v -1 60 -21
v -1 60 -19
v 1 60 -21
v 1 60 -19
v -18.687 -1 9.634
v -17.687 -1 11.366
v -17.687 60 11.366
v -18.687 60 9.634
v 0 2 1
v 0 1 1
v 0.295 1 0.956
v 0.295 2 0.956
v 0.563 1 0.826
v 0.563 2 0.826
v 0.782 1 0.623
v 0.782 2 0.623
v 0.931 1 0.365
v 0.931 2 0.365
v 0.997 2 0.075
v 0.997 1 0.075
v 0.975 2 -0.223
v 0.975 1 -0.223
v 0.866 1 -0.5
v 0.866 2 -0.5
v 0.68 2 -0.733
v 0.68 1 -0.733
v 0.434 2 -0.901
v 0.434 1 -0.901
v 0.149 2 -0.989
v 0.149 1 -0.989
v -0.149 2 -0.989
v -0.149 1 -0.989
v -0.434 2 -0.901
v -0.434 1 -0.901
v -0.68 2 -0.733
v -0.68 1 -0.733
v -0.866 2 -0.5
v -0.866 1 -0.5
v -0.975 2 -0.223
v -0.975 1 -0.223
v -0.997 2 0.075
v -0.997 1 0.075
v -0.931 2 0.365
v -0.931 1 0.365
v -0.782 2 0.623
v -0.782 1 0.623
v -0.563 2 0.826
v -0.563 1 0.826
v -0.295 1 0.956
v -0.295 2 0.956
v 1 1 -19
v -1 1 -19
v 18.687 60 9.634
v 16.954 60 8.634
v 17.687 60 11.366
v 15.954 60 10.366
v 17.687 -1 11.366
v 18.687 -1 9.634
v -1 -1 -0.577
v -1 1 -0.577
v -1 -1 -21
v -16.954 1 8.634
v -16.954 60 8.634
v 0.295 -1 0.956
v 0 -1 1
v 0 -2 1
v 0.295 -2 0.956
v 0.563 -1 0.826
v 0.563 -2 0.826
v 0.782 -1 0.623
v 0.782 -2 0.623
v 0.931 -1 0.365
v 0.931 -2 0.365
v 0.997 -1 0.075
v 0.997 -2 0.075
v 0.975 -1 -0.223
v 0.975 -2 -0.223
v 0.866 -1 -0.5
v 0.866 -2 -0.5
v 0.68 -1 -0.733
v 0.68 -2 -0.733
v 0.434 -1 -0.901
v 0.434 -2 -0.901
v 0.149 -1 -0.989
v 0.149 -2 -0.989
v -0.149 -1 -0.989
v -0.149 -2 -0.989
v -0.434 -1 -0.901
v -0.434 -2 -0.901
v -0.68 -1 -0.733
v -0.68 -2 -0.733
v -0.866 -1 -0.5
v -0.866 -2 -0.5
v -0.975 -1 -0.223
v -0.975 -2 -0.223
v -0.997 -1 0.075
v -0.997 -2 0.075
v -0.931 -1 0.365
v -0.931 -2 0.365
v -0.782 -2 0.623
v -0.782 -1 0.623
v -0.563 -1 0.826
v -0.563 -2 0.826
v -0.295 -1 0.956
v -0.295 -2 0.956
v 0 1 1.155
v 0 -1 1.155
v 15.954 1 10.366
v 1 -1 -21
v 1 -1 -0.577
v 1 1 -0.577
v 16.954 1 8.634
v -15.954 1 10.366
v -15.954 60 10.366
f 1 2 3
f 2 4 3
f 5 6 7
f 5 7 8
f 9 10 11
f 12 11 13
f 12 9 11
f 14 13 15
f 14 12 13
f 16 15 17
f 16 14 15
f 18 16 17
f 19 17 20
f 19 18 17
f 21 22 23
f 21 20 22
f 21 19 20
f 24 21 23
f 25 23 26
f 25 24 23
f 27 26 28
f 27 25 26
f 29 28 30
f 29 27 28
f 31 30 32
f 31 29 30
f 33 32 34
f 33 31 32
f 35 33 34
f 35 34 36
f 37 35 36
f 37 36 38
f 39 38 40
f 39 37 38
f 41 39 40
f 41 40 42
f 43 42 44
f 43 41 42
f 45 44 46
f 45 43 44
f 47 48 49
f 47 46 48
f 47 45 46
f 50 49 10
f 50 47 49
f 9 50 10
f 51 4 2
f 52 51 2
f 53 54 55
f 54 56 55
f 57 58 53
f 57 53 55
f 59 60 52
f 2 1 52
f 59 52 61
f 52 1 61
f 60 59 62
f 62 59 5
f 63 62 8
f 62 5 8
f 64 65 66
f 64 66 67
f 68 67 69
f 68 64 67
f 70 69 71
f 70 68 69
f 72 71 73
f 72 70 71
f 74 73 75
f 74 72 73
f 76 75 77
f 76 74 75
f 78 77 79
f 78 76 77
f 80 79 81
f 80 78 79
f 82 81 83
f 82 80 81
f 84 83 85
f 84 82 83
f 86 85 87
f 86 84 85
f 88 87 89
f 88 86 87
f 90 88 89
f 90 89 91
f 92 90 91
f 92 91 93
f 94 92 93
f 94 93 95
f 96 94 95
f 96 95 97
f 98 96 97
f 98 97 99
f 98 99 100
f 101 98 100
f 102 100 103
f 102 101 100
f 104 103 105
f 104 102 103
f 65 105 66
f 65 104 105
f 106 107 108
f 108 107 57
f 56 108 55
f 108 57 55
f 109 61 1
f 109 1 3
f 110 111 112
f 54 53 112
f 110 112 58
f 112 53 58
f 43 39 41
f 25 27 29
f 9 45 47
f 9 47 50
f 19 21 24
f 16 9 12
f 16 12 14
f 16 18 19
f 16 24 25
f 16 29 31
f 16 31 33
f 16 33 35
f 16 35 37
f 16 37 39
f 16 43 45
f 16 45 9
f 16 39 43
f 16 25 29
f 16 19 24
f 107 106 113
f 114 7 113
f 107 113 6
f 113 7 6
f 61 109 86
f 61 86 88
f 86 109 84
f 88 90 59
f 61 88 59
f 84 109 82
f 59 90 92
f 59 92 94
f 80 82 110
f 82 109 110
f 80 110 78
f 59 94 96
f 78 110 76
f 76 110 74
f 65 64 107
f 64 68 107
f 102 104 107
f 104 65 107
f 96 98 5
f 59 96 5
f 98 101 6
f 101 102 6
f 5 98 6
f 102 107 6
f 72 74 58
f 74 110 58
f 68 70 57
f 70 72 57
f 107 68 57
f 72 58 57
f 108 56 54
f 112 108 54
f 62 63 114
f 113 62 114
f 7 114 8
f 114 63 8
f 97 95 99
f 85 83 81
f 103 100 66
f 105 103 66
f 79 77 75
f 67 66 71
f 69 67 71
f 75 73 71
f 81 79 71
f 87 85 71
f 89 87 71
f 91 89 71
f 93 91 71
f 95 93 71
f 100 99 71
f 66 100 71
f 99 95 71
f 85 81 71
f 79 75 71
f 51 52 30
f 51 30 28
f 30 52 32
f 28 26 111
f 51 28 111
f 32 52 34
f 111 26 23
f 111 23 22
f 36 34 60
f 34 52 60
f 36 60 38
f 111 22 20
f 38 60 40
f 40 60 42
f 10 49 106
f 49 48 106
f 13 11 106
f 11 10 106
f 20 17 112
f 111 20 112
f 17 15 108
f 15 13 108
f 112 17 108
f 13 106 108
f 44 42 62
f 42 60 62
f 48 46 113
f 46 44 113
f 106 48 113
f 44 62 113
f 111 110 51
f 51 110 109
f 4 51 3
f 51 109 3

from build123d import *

# Parameters (mm, degrees)
ESQUISSE2_W                  = 2
ESQUISSE2_H                  = 2
ESQUISSE3_R                  = 1
BOSS_EXTRU_1_DEPTH           = 2
R_P_TITION_CIRCULAIRE1_COUNT = 3


with BuildPart() as part:
    # Balayage2: sweep along a curve in space
    with BuildLine() as balayage2_path:
        Line((0, 0, 0), (0, 0, -20))
        Line((0, 0, -20), (0, 60, -20))
    # Esquisse2 → Balayage2 (sweep)
    with BuildSketch(Plane.XY):
        Rectangle(ESQUISSE2_W, ESQUISSE2_H)
    balayage2 = sweep(path=balayage2_path.line, transition=Transition.RIGHT)

    # Esquisse3 → Boss.-Extru.1 (add, symmetric)
    with BuildSketch(Plane(origin=(0, 0, 0), x_dir=(1, 0, 0), z_dir=(0, 1, 0))):
        with Locations(Location((0, 0, 0), (0, 0, 270))):
            Circle(ESQUISSE3_R)
    extrude(amount=BOSS_EXTRU_1_DEPTH, both=True)

    # Répétition circulaire1: Balayage2 ×3 about axis
    r_p_tition_circulaire1_axis = Axis((0, 0, 0), (0, 1, 0))
    for i in range(1, R_P_TITION_CIRCULAIRE1_COUNT):
        add(balayage2.rotate(r_p_tition_circulaire1_axis, i * 360 / R_P_TITION_CIRCULAIRE1_COUNT))


solid = part.part
